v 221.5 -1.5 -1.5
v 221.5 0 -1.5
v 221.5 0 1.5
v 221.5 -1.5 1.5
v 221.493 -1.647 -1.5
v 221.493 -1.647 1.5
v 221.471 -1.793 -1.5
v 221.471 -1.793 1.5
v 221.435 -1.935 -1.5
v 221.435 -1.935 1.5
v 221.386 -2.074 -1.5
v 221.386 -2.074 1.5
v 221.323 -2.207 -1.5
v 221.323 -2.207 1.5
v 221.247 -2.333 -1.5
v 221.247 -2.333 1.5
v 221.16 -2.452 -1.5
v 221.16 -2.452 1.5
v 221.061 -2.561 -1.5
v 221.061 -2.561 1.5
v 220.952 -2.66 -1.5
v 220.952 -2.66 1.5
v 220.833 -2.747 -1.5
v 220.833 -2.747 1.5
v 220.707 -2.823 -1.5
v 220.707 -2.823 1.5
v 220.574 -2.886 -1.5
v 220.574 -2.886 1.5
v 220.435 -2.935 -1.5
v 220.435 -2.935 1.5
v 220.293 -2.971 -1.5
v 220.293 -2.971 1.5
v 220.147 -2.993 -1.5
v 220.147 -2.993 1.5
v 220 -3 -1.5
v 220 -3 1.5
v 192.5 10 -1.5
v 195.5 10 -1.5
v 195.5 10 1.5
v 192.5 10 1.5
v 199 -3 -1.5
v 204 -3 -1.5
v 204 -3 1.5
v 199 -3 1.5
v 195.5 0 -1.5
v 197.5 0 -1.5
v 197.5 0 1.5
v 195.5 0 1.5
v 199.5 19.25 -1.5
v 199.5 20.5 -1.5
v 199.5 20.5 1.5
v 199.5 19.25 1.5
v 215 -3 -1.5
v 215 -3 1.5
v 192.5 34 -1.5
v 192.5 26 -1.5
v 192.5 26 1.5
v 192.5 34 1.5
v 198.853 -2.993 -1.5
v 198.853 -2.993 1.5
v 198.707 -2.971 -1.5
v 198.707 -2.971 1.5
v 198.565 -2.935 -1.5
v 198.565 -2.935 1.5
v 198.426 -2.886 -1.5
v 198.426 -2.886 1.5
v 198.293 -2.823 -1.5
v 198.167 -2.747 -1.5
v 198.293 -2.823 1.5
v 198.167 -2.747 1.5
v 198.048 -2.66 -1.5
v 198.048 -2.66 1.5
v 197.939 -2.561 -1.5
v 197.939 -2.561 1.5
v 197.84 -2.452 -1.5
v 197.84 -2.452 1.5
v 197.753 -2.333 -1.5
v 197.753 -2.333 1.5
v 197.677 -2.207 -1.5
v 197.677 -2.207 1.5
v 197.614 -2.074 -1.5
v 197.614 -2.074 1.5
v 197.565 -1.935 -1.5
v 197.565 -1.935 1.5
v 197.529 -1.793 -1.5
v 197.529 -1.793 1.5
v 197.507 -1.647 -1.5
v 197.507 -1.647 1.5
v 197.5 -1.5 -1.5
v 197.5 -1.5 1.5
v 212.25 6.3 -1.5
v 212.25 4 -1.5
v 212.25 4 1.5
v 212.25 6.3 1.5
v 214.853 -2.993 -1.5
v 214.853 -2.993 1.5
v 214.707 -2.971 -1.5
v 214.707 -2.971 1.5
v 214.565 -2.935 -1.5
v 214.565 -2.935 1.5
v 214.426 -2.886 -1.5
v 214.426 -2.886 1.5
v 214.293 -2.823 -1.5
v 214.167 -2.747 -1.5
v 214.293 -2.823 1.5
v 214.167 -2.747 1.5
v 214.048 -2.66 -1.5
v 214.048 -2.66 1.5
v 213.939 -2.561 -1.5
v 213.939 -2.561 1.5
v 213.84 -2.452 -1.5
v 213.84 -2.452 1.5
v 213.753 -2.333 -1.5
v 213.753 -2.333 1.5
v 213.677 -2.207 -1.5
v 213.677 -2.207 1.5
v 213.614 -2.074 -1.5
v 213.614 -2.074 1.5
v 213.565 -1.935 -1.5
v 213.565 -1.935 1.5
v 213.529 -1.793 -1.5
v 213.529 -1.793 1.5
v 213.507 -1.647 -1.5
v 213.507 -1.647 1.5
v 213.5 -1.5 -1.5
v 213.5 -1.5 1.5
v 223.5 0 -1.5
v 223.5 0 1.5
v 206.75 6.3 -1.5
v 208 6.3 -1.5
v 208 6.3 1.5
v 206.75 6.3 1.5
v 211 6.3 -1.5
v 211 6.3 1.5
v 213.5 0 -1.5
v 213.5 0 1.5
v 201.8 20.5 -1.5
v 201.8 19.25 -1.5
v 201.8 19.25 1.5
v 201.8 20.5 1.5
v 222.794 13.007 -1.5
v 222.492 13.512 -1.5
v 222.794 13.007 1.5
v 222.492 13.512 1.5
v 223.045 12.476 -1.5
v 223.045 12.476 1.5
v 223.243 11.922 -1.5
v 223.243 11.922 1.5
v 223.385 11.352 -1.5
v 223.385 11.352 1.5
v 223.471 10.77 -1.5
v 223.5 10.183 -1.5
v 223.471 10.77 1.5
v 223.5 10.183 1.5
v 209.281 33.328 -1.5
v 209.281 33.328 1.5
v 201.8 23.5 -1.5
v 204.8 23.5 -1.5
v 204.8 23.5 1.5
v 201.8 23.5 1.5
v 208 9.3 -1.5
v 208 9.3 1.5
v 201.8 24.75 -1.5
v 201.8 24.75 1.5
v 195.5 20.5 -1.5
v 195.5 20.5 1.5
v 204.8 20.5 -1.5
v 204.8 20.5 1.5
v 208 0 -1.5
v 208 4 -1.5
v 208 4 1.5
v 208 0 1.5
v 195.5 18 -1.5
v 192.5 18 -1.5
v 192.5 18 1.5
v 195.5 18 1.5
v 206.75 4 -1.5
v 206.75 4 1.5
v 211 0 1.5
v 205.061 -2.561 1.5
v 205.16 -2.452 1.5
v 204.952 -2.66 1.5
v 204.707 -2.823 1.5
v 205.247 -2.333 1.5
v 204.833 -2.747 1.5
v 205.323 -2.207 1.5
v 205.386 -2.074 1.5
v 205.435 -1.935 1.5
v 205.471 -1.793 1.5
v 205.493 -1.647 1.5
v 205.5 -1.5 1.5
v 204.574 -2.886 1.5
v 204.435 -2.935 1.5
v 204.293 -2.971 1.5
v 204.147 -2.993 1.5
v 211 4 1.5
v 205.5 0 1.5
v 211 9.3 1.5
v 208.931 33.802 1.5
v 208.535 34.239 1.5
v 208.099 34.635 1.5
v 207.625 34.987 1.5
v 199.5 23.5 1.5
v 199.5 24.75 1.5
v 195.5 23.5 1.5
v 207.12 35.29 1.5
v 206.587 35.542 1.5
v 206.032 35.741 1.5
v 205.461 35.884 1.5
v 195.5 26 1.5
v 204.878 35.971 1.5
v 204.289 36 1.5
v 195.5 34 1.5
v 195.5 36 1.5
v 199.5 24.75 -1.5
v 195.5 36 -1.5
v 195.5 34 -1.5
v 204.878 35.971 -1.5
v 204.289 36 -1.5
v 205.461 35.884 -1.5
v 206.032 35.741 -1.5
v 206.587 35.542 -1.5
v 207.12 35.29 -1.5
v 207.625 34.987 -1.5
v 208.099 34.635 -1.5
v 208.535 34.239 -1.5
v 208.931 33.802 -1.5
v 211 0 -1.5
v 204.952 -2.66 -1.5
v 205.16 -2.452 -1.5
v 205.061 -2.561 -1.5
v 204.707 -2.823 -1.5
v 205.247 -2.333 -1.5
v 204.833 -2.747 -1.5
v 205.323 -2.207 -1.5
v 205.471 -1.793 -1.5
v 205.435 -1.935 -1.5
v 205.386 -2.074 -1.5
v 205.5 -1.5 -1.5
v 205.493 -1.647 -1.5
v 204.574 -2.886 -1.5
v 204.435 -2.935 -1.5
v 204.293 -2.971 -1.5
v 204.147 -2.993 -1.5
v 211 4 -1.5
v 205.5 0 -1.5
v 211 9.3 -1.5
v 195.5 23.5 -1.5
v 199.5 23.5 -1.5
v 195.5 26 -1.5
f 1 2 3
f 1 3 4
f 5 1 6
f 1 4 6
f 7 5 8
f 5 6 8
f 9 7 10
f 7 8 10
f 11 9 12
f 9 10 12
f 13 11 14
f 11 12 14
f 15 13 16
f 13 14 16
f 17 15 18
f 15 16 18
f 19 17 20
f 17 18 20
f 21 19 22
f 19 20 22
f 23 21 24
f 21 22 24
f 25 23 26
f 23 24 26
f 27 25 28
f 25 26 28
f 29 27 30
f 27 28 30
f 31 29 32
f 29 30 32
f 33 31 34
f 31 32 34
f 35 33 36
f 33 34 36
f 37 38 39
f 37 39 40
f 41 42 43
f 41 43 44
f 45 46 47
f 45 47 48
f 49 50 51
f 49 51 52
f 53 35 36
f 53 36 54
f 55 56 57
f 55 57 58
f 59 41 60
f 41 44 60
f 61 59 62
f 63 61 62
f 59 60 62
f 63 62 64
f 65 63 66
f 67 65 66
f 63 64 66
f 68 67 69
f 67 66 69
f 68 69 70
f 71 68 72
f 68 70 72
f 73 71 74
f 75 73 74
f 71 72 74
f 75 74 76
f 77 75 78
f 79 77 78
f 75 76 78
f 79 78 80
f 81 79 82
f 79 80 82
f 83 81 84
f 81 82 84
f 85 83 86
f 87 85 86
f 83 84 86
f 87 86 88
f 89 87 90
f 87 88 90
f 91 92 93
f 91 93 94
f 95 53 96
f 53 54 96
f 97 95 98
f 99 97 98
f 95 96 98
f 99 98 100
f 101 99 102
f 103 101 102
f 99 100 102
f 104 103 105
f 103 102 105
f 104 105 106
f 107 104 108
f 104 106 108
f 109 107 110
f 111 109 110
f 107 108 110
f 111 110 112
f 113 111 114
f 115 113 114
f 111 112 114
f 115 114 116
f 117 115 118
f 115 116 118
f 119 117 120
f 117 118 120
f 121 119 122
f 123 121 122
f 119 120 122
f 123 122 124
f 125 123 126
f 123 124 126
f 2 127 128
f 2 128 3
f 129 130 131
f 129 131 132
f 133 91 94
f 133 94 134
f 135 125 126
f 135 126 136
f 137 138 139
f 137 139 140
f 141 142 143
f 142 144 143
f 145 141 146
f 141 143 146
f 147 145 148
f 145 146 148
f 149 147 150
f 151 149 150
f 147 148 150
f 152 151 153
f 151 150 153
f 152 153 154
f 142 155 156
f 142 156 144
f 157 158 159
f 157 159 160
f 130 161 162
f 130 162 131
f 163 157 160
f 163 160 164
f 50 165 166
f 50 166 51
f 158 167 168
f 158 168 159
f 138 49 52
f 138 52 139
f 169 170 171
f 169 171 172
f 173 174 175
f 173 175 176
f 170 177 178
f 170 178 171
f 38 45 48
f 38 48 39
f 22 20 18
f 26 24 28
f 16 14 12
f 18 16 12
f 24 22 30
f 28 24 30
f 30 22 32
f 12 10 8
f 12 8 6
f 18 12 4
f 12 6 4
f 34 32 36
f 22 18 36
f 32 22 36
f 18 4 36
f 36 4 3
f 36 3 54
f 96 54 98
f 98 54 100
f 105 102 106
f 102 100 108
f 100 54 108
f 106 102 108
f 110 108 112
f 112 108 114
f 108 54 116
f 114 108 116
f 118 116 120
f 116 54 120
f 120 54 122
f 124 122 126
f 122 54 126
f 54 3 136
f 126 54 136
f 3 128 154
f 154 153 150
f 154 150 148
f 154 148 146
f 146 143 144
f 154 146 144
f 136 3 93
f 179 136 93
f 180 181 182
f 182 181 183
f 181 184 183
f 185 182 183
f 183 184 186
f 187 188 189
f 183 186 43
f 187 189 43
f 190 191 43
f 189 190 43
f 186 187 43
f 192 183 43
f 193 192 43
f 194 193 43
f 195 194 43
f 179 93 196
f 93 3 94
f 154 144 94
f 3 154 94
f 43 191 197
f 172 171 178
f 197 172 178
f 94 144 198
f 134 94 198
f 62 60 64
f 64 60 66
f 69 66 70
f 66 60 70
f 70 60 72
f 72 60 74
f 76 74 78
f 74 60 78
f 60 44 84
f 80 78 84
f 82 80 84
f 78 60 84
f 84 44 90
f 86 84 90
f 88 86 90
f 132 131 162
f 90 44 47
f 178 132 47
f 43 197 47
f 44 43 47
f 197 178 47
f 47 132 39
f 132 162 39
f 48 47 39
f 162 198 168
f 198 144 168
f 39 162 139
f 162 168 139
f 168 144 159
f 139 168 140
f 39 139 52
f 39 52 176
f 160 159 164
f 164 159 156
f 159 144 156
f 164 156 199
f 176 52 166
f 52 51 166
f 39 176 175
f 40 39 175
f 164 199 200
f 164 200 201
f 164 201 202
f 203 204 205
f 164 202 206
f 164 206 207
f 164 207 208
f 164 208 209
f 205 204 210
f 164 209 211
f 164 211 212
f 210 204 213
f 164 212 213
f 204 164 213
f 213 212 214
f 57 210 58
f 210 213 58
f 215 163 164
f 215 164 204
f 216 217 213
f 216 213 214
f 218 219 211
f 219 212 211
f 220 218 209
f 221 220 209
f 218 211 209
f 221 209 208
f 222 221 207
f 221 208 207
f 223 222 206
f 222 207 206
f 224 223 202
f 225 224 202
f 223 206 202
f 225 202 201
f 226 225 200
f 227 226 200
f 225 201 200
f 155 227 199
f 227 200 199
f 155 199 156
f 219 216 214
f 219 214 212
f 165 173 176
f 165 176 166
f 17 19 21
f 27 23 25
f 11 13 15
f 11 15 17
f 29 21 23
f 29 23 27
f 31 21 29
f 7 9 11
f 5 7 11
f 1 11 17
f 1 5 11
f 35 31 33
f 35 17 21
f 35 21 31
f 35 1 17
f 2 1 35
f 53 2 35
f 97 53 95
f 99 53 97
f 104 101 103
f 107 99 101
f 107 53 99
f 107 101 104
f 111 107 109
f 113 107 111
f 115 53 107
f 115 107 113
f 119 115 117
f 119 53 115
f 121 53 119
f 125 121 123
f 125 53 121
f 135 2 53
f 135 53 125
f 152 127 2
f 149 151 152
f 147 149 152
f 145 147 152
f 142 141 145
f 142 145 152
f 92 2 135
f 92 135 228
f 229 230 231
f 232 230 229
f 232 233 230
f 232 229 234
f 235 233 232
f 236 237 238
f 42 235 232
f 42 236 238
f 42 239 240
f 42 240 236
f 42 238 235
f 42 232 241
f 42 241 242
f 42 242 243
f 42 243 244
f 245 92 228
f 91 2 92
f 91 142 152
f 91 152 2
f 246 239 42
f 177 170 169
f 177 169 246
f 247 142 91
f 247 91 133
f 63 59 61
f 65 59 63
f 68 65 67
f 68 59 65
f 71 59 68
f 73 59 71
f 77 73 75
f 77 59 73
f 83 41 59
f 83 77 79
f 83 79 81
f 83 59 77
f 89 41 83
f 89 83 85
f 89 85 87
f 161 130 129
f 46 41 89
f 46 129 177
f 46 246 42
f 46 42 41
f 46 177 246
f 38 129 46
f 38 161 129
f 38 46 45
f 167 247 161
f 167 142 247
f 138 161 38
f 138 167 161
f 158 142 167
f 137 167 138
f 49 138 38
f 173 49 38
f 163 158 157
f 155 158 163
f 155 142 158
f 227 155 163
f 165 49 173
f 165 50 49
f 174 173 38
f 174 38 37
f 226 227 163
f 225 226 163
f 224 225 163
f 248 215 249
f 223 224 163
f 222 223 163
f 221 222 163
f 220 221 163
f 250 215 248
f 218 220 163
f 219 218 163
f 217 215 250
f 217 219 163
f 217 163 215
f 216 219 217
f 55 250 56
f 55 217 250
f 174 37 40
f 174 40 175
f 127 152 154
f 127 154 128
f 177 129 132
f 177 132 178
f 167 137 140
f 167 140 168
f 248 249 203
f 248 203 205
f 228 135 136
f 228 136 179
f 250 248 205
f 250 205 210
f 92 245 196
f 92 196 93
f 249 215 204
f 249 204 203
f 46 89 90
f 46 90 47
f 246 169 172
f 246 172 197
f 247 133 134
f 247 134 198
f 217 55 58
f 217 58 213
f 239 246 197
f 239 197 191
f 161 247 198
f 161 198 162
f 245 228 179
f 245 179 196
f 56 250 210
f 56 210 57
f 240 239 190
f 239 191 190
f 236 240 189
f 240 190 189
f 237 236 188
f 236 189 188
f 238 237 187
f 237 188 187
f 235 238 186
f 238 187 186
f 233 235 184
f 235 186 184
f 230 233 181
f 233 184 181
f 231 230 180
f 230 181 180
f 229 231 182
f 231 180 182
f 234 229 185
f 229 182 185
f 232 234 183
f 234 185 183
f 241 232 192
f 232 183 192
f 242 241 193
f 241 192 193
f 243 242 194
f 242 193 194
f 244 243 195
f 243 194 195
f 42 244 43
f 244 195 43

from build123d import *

# Parameters (mm, degrees)
PAD007_DEPTH = 3
FILLET011_R  = 6
FILLET012_R  = 1.5


with BuildPart() as part:
    # Sketch006 → Pad007 (new body)
    with BuildSketch(Plane(origin=(195.5, 0, -1.5), x_dir=(1, 0, 0), z_dir=(0, 0, 1))):
        Polygon((0, 36), (12, 36), (28, 12), (28, 0), (26, 0), (26, -3), (18, -3), (18, 0), (15.5, 0), (15.5, 4), (16.75, 4), (16.75, 6.3), (15.5, 6.3), (15.5, 9.3), (12.5, 9.3), (12.5, 6.3), (11.25, 6.3), (11.25, 4), (12.5, 4), (12.5, 0), (10, 0), (10, -3), (2, -3), (2, 0), (0, 0), (0, 10), (-3, 10), (-3, 18), (0, 18), (0, 20.5), (4, 20.5), (4, 19.25), (6.3, 19.25), (6.3, 20.5), (9.3, 20.5), (9.3, 23.5), (6.3, 23.5), (6.3, 24.75), (4, 24.75), (4, 23.5), (0, 23.5), (0, 26), (-3, 26), (-3, 34), (0, 34), align=None)
    extrude(amount=PAD007_DEPTH)

    # Fillet011
    fillet011_edges = [part.edges().sort_by_distance(p)[0] for p in [
        (207.5, 36, 0),
        (223.5, 12, 0),
    ]]
    fillet(fillet011_edges, radius=FILLET011_R)

    # Fillet012
    fillet012_edges = [part.edges().sort_by_distance(p)[0] for p in [
        (221.5, -3, 0),
        (213.5, -3, 0),
        (205.5, -3, 0),
        (197.5, -3, 0),
    ]]
    fillet(fillet012_edges, radius=FILLET012_R)


solid = part.part
